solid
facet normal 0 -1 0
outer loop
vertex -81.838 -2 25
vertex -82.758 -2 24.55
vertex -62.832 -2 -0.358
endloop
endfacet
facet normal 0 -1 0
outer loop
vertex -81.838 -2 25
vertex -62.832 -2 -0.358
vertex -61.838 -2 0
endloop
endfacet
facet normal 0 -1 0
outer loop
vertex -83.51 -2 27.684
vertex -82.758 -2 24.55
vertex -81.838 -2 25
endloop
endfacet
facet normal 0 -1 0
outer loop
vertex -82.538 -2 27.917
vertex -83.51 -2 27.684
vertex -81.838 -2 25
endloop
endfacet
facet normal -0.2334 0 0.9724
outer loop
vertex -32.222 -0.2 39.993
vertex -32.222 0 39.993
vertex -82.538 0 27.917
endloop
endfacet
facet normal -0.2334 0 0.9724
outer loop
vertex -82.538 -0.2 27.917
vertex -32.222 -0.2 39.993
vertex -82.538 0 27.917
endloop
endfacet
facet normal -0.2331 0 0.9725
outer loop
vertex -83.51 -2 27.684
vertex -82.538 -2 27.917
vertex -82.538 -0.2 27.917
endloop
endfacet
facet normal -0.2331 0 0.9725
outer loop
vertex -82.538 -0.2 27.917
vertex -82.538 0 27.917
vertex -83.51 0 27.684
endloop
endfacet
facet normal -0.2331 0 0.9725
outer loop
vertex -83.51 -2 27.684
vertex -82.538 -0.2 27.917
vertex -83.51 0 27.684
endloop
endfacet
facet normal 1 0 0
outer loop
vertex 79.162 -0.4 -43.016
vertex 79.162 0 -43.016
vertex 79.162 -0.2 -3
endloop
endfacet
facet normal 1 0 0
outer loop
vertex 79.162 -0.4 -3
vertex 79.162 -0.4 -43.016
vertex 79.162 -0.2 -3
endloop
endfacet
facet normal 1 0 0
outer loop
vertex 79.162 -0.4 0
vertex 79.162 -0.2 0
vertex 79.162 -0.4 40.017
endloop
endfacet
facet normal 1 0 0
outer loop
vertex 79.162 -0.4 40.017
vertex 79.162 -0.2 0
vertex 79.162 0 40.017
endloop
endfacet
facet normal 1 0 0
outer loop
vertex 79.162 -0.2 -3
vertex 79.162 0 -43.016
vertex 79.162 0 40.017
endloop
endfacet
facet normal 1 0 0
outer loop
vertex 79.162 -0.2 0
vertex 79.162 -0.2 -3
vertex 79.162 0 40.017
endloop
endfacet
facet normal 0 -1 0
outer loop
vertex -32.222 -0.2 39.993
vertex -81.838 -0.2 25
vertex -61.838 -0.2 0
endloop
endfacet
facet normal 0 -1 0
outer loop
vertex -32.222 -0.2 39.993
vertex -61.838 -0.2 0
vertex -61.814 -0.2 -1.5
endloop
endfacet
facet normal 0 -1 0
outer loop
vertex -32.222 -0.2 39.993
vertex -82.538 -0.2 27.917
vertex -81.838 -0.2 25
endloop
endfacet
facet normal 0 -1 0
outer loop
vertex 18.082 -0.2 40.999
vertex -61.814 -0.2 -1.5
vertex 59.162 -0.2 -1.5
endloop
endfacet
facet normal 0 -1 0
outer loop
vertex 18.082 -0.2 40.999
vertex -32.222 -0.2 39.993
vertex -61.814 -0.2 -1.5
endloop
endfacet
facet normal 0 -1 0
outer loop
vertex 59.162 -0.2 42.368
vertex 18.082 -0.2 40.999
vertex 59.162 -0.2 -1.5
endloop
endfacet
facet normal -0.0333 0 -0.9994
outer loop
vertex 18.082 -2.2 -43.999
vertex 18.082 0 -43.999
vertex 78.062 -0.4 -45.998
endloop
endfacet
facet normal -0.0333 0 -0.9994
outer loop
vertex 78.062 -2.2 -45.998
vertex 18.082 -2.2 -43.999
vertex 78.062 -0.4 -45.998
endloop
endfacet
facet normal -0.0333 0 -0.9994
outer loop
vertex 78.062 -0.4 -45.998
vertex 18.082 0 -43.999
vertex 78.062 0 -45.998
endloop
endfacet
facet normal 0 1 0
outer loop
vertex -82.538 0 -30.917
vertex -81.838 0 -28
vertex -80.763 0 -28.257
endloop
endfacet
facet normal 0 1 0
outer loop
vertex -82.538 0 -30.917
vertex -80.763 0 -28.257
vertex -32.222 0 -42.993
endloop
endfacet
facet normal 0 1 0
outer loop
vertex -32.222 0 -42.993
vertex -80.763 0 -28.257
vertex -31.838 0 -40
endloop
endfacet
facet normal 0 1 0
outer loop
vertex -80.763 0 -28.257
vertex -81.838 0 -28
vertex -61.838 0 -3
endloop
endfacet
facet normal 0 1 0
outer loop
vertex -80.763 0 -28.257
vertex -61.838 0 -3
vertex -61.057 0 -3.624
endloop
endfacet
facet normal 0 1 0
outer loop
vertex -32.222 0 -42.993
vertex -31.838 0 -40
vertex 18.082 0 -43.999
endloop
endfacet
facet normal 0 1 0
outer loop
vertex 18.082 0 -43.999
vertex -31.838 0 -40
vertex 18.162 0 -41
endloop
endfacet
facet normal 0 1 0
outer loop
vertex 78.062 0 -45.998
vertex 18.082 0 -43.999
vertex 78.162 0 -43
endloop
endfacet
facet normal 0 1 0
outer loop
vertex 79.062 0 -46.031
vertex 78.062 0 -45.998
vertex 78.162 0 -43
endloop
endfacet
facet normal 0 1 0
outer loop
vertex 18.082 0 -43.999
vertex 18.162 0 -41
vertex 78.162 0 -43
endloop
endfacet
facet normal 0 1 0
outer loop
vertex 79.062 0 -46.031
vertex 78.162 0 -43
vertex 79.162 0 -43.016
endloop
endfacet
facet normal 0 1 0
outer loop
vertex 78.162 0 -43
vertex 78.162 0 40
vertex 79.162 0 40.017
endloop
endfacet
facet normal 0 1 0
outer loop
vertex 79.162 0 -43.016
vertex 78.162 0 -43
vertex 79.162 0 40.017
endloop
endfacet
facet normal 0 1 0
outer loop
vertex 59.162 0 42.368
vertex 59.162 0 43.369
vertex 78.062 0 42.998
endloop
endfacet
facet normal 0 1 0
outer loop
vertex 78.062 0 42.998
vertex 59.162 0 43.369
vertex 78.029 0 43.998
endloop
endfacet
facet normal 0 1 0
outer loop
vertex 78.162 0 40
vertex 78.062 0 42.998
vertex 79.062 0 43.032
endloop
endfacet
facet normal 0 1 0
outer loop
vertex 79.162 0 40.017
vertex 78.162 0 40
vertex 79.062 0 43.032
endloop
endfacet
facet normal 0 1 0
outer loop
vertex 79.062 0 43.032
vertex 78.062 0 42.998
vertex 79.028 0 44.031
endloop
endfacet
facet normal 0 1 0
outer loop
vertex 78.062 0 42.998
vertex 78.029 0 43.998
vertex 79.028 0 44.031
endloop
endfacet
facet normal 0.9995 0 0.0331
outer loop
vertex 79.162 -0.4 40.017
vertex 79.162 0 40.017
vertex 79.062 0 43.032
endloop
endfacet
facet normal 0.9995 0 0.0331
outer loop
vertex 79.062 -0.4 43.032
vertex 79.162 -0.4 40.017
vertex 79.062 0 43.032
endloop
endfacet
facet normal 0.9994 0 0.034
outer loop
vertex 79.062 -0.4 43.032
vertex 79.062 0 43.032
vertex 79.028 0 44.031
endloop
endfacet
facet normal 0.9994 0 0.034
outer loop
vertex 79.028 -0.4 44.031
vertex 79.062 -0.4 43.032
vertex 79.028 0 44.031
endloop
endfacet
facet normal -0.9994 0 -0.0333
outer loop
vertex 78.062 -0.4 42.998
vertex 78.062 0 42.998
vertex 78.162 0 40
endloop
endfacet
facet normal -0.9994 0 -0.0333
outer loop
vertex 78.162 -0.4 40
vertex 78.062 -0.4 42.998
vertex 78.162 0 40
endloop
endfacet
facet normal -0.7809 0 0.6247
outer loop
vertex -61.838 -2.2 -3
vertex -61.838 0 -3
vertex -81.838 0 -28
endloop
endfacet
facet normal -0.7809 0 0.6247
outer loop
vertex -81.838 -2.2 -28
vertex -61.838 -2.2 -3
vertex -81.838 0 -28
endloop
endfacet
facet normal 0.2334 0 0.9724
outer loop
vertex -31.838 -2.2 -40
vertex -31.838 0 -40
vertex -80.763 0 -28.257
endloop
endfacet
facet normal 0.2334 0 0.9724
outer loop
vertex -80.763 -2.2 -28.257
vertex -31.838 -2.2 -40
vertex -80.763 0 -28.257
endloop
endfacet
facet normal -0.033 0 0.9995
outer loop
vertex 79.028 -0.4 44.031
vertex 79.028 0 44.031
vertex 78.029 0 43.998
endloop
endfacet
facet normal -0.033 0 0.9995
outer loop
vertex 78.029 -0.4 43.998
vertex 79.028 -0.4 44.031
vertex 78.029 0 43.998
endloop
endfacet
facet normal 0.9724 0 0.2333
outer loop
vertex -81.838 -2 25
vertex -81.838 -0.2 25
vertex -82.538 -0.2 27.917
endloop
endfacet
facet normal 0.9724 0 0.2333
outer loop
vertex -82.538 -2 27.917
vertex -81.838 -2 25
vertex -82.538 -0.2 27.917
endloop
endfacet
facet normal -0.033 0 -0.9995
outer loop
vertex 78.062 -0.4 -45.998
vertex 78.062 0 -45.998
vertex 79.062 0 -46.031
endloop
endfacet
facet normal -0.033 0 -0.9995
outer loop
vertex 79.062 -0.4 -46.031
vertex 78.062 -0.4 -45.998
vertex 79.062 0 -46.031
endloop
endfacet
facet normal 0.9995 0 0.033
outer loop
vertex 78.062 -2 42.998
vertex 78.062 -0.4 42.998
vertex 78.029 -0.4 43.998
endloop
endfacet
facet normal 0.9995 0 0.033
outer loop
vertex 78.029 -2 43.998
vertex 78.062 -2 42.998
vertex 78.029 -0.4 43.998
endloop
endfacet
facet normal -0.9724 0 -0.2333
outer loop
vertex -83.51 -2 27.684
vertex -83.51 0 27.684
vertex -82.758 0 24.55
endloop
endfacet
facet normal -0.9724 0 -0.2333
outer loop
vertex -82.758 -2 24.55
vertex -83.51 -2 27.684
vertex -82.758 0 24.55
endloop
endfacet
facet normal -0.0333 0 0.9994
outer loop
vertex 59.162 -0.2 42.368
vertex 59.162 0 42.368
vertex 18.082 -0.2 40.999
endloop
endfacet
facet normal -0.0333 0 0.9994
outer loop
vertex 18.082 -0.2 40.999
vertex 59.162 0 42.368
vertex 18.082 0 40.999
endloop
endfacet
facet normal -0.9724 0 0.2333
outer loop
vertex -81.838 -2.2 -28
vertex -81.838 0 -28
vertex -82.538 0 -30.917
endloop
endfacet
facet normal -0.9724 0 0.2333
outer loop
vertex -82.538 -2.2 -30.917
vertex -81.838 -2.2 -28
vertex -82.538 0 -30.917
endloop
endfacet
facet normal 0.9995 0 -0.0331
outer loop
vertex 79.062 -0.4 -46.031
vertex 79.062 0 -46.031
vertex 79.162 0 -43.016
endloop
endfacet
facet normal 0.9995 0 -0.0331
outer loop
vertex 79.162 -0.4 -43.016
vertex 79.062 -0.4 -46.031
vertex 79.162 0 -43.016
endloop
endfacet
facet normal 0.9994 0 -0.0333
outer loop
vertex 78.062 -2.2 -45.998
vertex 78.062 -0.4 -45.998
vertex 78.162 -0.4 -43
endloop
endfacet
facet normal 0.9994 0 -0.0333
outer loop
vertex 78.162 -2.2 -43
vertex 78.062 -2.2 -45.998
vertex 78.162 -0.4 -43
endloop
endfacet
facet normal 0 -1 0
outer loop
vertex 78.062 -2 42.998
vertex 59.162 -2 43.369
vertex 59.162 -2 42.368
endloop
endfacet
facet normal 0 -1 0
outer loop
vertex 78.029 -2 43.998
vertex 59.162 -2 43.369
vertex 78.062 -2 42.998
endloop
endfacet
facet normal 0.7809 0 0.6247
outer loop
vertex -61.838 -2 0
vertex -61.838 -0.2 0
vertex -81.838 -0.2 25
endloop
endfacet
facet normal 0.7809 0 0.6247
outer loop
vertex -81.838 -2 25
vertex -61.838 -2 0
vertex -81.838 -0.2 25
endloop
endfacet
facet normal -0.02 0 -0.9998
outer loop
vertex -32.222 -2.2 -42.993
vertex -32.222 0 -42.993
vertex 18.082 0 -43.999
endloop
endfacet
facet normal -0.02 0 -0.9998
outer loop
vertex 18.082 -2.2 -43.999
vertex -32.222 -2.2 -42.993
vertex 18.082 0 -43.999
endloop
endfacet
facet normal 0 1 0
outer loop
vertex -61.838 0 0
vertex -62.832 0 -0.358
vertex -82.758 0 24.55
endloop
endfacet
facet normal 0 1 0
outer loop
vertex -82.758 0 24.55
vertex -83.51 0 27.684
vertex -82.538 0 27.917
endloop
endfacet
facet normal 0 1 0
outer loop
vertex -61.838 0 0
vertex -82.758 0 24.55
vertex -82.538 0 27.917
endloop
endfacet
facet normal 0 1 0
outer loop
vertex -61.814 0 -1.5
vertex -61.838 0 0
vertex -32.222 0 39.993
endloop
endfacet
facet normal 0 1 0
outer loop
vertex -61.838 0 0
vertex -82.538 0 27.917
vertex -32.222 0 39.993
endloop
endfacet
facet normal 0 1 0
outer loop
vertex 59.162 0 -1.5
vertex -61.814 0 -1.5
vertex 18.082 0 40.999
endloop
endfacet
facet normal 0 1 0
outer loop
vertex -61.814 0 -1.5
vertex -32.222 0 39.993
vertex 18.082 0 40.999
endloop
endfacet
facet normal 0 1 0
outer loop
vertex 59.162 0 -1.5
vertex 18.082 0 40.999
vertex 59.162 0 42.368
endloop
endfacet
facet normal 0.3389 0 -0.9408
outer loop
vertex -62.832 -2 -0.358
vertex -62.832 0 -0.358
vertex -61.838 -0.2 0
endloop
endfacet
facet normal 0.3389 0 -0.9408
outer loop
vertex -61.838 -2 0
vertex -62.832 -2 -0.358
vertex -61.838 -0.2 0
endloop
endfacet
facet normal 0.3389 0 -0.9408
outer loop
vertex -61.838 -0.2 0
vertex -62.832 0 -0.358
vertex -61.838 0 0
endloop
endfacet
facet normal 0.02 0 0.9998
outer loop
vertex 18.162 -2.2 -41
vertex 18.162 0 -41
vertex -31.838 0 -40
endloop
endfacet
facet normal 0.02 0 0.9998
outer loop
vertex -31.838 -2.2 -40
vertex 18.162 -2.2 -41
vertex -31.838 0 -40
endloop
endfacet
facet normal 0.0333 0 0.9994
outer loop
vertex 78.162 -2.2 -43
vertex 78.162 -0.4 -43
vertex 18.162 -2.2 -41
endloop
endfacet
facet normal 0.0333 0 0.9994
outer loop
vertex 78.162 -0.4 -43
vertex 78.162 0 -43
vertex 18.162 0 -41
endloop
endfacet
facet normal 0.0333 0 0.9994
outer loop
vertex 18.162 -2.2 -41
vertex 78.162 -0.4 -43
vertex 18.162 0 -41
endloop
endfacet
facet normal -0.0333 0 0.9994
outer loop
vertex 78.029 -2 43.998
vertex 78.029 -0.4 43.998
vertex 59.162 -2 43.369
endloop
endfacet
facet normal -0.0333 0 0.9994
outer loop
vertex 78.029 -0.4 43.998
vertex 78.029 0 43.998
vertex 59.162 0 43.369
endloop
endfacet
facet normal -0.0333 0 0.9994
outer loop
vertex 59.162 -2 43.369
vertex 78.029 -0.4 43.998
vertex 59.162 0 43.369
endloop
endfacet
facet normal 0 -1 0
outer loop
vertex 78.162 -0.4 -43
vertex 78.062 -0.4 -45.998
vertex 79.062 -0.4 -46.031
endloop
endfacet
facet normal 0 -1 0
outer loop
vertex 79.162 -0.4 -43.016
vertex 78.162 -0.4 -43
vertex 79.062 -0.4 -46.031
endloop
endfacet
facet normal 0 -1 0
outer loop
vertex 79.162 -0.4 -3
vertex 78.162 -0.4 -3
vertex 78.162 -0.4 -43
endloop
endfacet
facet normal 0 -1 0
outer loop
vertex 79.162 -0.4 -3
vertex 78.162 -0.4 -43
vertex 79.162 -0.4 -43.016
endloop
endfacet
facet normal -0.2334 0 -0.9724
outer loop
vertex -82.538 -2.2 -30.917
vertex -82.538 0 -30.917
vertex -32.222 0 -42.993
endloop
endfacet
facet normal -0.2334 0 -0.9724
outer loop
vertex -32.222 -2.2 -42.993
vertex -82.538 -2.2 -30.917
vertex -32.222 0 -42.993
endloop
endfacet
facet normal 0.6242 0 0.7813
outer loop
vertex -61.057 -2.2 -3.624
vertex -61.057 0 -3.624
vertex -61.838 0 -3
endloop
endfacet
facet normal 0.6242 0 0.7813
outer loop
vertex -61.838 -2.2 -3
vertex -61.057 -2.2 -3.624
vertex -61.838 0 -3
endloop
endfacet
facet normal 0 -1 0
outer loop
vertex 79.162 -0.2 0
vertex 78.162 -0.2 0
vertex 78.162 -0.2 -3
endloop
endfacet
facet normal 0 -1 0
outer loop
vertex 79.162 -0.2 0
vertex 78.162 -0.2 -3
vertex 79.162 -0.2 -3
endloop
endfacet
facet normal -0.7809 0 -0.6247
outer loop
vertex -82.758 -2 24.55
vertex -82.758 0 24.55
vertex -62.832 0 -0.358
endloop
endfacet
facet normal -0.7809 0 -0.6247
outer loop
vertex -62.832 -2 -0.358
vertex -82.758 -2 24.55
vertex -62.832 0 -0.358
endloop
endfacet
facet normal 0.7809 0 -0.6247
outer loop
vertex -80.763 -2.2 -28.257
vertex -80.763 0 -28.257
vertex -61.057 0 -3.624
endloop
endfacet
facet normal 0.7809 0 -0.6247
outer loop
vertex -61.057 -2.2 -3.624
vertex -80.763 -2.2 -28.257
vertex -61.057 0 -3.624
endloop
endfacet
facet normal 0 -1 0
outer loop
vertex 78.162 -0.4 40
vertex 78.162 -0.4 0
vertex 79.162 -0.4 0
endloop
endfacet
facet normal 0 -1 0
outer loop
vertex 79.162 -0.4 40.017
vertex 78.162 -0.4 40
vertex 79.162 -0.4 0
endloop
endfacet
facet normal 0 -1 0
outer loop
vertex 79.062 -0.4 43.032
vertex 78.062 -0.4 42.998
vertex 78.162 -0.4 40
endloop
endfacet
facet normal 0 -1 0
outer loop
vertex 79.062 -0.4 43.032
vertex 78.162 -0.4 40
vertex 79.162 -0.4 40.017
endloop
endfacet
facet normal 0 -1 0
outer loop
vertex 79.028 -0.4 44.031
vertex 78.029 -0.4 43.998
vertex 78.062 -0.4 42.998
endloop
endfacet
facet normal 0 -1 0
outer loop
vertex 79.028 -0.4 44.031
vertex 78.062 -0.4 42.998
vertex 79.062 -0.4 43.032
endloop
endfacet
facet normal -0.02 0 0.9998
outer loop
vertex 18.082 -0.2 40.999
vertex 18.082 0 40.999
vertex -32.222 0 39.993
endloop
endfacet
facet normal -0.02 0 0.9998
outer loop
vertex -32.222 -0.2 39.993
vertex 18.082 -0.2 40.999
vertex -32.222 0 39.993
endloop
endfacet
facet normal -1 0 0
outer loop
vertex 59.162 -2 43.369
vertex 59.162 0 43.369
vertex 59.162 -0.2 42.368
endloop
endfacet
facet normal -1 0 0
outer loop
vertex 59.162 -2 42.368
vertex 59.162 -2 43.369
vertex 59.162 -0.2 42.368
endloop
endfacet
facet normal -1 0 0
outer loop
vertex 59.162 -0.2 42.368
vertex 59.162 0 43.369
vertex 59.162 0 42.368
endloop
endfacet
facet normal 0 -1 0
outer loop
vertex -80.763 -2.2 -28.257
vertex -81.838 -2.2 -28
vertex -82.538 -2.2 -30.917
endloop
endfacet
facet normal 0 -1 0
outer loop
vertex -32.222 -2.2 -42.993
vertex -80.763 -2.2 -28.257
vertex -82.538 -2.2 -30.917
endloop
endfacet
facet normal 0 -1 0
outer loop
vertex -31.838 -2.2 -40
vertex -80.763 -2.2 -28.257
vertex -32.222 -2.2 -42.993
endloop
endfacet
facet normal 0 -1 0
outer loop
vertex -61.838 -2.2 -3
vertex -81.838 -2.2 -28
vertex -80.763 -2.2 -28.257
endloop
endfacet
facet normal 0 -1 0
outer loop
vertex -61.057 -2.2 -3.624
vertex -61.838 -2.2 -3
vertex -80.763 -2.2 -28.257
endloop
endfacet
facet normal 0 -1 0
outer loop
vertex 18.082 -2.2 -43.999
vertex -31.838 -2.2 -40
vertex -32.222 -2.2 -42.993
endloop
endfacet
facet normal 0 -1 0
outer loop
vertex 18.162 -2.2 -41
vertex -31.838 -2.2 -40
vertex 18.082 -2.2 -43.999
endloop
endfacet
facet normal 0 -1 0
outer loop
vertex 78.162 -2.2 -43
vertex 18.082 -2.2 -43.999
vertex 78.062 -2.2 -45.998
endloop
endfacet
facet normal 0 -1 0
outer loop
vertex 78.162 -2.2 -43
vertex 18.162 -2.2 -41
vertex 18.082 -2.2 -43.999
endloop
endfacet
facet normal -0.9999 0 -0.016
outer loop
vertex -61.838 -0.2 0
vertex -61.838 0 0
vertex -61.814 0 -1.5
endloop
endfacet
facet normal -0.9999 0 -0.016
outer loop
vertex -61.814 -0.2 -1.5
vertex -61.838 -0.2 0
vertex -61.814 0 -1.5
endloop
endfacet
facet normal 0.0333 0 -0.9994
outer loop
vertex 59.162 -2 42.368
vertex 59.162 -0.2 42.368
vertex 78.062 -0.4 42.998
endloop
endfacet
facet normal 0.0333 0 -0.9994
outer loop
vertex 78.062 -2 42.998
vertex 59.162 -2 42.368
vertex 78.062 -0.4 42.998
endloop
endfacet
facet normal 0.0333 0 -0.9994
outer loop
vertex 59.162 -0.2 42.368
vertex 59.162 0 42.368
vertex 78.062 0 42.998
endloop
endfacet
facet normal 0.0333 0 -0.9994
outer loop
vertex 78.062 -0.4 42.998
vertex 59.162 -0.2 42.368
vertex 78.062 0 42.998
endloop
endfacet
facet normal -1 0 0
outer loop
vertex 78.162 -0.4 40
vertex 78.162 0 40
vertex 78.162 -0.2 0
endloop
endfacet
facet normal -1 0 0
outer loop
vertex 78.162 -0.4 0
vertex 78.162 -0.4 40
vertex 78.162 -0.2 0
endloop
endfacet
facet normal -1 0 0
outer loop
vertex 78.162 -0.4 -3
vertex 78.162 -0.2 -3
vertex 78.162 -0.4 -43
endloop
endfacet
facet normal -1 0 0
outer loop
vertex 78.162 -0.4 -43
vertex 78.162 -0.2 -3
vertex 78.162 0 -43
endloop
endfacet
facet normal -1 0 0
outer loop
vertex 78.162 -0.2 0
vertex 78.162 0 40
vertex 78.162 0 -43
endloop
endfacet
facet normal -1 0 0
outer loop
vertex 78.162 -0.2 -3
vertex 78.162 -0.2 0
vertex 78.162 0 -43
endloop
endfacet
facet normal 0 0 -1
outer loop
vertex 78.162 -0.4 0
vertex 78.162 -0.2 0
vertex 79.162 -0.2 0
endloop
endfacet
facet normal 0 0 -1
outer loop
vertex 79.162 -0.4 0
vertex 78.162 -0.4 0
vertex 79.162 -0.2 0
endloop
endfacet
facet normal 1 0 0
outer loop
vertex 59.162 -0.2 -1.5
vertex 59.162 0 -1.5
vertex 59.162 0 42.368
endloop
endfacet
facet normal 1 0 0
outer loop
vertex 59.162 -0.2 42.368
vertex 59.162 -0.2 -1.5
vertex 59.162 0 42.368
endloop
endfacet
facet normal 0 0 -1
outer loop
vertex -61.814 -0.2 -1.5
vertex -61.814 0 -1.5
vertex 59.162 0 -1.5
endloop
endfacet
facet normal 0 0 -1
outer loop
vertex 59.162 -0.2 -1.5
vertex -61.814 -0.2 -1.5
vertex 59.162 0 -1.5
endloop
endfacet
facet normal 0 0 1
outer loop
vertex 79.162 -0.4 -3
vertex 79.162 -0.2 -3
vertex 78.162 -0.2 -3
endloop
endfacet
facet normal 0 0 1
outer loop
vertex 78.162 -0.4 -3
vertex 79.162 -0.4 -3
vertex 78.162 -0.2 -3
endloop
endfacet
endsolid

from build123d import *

# Parameters (mm, degrees)
F1_DEPTH = 0.2
F2_DEPTH = 2
F3_DEPTH = 2.2
F6_DEPTH = 0.4


# Not quite as in the source:
# - a feature of the source that left no trace in its solid (it failed there, or was rolled back) is left out
# - a feature names something its author has since deleted; it is built from what else it names


with BuildPart() as f1:
    # F0 (on Front) → F1 (new body)
    with BuildSketch(Plane.XZ):
        Polygon((-31.8378226987, 37), (-81.8378226987, 25), (-61.8378226987, 0), (-61.813899618, -1.4998092166), (59.1621773013, -1.4998092166), (59.1621773013, 39.3666666667), (18.1621773013, 38), align=None)
        Polygon((-82.5379415561, 27.9171619059), (-81.8378226987, 25), (-31.8378226987, 37), (18.1621773013, 38), (59.1621773013, 39.3666666667), (59.1621773013, 42.3683328706), (18.0822075051, 40.9990005441), (-32.2223249338, 39.9929098953), align=None)
    extrude(amount=F1_DEPTH)

    # F0 (on Front) → F2 (join)
    with BuildSketch(Plane.XZ):
        Polygon((-61.8378226987, 0), (-81.8378226987, 25), (-82.5379415561, 27.9171619059), (-83.5103288581, 27.6837889535), (-82.7581217792, 24.5495927912), (-62.8322434414, -0.357755131), align=None)
        Polygon((59.1621773013, 43.3688882719), (59.1621773013, 42.3683328706), (78.0622328106, 42.9983347209), (78.0289179803, 43.9977796279), align=None)
    extrude(amount=F2_DEPTH)



with BuildPart() as f1b:
    # F0 (on Front) → F1, piece 2 (new body)
    with BuildSketch(Plane.XZ):
        Polygon((79.1621773013, 0), (78.1621773013, 0), (78.1621773013, -1.4998092166), (78.1621773013, -2.9996184332), (79.1621773013, -2.9996184332), (79.1621773013, -1.4998092166), align=None)
    extrude(amount=F1_DEPTH)


with BuildPart() as f3:
    # F0 (on Front) → F3 (new body)
    with BuildSketch(Plane.XZ):
        Polygon((-80.7634729945, -28.2574623622), (-81.8378226987, -27.9996184332), (-82.5379415561, -30.9167803391), (-32.2223249338, -42.9925283285), (18.0822075051, -43.9986189773), (78.0622328106, -45.9979531541), (78.1621773013, -42.9996184332), (18.1621773013, -40.9996184332), (-31.8378226987, -39.9996184332), align=None)
        Polygon((-61.0569538893, -3.6243134808), (-61.8378226987, -2.9996184332), (-81.8378226987, -27.9996184332), (-80.7634729945, -28.2574623622), align=None)
    extrude(amount=F3_DEPTH)


with BuildPart() as f1_1:
    add(f1.part)

    add(f1b.part)  # F6 merges F1b

    add(f3.part)  # F6 merges F3
    # F0 (on Front) → F6 (join)
    with BuildSketch(Plane.XZ):
        Polygon((78.0289179803, 43.9977796279), (78.0622328106, 42.9983347209), (78.1621773013, 40), (78.1621773013, 0), (79.1621773013, 0), (79.1621773013, 40.0166620396), (79.0616777176, 43.0316495512), (79.0283628873, 44.0310944581), align=None)
        Polygon((78.1621773013, -42.9996184332), (78.0622328106, -45.9979531541), (79.0616777176, -46.0312679844), (79.1621773013, -43.0162804728), (79.1621773013, -2.9996184332), (78.1621773013, -2.9996184332), align=None)
    extrude(amount=F6_DEPTH)


solid = f1_1.part
